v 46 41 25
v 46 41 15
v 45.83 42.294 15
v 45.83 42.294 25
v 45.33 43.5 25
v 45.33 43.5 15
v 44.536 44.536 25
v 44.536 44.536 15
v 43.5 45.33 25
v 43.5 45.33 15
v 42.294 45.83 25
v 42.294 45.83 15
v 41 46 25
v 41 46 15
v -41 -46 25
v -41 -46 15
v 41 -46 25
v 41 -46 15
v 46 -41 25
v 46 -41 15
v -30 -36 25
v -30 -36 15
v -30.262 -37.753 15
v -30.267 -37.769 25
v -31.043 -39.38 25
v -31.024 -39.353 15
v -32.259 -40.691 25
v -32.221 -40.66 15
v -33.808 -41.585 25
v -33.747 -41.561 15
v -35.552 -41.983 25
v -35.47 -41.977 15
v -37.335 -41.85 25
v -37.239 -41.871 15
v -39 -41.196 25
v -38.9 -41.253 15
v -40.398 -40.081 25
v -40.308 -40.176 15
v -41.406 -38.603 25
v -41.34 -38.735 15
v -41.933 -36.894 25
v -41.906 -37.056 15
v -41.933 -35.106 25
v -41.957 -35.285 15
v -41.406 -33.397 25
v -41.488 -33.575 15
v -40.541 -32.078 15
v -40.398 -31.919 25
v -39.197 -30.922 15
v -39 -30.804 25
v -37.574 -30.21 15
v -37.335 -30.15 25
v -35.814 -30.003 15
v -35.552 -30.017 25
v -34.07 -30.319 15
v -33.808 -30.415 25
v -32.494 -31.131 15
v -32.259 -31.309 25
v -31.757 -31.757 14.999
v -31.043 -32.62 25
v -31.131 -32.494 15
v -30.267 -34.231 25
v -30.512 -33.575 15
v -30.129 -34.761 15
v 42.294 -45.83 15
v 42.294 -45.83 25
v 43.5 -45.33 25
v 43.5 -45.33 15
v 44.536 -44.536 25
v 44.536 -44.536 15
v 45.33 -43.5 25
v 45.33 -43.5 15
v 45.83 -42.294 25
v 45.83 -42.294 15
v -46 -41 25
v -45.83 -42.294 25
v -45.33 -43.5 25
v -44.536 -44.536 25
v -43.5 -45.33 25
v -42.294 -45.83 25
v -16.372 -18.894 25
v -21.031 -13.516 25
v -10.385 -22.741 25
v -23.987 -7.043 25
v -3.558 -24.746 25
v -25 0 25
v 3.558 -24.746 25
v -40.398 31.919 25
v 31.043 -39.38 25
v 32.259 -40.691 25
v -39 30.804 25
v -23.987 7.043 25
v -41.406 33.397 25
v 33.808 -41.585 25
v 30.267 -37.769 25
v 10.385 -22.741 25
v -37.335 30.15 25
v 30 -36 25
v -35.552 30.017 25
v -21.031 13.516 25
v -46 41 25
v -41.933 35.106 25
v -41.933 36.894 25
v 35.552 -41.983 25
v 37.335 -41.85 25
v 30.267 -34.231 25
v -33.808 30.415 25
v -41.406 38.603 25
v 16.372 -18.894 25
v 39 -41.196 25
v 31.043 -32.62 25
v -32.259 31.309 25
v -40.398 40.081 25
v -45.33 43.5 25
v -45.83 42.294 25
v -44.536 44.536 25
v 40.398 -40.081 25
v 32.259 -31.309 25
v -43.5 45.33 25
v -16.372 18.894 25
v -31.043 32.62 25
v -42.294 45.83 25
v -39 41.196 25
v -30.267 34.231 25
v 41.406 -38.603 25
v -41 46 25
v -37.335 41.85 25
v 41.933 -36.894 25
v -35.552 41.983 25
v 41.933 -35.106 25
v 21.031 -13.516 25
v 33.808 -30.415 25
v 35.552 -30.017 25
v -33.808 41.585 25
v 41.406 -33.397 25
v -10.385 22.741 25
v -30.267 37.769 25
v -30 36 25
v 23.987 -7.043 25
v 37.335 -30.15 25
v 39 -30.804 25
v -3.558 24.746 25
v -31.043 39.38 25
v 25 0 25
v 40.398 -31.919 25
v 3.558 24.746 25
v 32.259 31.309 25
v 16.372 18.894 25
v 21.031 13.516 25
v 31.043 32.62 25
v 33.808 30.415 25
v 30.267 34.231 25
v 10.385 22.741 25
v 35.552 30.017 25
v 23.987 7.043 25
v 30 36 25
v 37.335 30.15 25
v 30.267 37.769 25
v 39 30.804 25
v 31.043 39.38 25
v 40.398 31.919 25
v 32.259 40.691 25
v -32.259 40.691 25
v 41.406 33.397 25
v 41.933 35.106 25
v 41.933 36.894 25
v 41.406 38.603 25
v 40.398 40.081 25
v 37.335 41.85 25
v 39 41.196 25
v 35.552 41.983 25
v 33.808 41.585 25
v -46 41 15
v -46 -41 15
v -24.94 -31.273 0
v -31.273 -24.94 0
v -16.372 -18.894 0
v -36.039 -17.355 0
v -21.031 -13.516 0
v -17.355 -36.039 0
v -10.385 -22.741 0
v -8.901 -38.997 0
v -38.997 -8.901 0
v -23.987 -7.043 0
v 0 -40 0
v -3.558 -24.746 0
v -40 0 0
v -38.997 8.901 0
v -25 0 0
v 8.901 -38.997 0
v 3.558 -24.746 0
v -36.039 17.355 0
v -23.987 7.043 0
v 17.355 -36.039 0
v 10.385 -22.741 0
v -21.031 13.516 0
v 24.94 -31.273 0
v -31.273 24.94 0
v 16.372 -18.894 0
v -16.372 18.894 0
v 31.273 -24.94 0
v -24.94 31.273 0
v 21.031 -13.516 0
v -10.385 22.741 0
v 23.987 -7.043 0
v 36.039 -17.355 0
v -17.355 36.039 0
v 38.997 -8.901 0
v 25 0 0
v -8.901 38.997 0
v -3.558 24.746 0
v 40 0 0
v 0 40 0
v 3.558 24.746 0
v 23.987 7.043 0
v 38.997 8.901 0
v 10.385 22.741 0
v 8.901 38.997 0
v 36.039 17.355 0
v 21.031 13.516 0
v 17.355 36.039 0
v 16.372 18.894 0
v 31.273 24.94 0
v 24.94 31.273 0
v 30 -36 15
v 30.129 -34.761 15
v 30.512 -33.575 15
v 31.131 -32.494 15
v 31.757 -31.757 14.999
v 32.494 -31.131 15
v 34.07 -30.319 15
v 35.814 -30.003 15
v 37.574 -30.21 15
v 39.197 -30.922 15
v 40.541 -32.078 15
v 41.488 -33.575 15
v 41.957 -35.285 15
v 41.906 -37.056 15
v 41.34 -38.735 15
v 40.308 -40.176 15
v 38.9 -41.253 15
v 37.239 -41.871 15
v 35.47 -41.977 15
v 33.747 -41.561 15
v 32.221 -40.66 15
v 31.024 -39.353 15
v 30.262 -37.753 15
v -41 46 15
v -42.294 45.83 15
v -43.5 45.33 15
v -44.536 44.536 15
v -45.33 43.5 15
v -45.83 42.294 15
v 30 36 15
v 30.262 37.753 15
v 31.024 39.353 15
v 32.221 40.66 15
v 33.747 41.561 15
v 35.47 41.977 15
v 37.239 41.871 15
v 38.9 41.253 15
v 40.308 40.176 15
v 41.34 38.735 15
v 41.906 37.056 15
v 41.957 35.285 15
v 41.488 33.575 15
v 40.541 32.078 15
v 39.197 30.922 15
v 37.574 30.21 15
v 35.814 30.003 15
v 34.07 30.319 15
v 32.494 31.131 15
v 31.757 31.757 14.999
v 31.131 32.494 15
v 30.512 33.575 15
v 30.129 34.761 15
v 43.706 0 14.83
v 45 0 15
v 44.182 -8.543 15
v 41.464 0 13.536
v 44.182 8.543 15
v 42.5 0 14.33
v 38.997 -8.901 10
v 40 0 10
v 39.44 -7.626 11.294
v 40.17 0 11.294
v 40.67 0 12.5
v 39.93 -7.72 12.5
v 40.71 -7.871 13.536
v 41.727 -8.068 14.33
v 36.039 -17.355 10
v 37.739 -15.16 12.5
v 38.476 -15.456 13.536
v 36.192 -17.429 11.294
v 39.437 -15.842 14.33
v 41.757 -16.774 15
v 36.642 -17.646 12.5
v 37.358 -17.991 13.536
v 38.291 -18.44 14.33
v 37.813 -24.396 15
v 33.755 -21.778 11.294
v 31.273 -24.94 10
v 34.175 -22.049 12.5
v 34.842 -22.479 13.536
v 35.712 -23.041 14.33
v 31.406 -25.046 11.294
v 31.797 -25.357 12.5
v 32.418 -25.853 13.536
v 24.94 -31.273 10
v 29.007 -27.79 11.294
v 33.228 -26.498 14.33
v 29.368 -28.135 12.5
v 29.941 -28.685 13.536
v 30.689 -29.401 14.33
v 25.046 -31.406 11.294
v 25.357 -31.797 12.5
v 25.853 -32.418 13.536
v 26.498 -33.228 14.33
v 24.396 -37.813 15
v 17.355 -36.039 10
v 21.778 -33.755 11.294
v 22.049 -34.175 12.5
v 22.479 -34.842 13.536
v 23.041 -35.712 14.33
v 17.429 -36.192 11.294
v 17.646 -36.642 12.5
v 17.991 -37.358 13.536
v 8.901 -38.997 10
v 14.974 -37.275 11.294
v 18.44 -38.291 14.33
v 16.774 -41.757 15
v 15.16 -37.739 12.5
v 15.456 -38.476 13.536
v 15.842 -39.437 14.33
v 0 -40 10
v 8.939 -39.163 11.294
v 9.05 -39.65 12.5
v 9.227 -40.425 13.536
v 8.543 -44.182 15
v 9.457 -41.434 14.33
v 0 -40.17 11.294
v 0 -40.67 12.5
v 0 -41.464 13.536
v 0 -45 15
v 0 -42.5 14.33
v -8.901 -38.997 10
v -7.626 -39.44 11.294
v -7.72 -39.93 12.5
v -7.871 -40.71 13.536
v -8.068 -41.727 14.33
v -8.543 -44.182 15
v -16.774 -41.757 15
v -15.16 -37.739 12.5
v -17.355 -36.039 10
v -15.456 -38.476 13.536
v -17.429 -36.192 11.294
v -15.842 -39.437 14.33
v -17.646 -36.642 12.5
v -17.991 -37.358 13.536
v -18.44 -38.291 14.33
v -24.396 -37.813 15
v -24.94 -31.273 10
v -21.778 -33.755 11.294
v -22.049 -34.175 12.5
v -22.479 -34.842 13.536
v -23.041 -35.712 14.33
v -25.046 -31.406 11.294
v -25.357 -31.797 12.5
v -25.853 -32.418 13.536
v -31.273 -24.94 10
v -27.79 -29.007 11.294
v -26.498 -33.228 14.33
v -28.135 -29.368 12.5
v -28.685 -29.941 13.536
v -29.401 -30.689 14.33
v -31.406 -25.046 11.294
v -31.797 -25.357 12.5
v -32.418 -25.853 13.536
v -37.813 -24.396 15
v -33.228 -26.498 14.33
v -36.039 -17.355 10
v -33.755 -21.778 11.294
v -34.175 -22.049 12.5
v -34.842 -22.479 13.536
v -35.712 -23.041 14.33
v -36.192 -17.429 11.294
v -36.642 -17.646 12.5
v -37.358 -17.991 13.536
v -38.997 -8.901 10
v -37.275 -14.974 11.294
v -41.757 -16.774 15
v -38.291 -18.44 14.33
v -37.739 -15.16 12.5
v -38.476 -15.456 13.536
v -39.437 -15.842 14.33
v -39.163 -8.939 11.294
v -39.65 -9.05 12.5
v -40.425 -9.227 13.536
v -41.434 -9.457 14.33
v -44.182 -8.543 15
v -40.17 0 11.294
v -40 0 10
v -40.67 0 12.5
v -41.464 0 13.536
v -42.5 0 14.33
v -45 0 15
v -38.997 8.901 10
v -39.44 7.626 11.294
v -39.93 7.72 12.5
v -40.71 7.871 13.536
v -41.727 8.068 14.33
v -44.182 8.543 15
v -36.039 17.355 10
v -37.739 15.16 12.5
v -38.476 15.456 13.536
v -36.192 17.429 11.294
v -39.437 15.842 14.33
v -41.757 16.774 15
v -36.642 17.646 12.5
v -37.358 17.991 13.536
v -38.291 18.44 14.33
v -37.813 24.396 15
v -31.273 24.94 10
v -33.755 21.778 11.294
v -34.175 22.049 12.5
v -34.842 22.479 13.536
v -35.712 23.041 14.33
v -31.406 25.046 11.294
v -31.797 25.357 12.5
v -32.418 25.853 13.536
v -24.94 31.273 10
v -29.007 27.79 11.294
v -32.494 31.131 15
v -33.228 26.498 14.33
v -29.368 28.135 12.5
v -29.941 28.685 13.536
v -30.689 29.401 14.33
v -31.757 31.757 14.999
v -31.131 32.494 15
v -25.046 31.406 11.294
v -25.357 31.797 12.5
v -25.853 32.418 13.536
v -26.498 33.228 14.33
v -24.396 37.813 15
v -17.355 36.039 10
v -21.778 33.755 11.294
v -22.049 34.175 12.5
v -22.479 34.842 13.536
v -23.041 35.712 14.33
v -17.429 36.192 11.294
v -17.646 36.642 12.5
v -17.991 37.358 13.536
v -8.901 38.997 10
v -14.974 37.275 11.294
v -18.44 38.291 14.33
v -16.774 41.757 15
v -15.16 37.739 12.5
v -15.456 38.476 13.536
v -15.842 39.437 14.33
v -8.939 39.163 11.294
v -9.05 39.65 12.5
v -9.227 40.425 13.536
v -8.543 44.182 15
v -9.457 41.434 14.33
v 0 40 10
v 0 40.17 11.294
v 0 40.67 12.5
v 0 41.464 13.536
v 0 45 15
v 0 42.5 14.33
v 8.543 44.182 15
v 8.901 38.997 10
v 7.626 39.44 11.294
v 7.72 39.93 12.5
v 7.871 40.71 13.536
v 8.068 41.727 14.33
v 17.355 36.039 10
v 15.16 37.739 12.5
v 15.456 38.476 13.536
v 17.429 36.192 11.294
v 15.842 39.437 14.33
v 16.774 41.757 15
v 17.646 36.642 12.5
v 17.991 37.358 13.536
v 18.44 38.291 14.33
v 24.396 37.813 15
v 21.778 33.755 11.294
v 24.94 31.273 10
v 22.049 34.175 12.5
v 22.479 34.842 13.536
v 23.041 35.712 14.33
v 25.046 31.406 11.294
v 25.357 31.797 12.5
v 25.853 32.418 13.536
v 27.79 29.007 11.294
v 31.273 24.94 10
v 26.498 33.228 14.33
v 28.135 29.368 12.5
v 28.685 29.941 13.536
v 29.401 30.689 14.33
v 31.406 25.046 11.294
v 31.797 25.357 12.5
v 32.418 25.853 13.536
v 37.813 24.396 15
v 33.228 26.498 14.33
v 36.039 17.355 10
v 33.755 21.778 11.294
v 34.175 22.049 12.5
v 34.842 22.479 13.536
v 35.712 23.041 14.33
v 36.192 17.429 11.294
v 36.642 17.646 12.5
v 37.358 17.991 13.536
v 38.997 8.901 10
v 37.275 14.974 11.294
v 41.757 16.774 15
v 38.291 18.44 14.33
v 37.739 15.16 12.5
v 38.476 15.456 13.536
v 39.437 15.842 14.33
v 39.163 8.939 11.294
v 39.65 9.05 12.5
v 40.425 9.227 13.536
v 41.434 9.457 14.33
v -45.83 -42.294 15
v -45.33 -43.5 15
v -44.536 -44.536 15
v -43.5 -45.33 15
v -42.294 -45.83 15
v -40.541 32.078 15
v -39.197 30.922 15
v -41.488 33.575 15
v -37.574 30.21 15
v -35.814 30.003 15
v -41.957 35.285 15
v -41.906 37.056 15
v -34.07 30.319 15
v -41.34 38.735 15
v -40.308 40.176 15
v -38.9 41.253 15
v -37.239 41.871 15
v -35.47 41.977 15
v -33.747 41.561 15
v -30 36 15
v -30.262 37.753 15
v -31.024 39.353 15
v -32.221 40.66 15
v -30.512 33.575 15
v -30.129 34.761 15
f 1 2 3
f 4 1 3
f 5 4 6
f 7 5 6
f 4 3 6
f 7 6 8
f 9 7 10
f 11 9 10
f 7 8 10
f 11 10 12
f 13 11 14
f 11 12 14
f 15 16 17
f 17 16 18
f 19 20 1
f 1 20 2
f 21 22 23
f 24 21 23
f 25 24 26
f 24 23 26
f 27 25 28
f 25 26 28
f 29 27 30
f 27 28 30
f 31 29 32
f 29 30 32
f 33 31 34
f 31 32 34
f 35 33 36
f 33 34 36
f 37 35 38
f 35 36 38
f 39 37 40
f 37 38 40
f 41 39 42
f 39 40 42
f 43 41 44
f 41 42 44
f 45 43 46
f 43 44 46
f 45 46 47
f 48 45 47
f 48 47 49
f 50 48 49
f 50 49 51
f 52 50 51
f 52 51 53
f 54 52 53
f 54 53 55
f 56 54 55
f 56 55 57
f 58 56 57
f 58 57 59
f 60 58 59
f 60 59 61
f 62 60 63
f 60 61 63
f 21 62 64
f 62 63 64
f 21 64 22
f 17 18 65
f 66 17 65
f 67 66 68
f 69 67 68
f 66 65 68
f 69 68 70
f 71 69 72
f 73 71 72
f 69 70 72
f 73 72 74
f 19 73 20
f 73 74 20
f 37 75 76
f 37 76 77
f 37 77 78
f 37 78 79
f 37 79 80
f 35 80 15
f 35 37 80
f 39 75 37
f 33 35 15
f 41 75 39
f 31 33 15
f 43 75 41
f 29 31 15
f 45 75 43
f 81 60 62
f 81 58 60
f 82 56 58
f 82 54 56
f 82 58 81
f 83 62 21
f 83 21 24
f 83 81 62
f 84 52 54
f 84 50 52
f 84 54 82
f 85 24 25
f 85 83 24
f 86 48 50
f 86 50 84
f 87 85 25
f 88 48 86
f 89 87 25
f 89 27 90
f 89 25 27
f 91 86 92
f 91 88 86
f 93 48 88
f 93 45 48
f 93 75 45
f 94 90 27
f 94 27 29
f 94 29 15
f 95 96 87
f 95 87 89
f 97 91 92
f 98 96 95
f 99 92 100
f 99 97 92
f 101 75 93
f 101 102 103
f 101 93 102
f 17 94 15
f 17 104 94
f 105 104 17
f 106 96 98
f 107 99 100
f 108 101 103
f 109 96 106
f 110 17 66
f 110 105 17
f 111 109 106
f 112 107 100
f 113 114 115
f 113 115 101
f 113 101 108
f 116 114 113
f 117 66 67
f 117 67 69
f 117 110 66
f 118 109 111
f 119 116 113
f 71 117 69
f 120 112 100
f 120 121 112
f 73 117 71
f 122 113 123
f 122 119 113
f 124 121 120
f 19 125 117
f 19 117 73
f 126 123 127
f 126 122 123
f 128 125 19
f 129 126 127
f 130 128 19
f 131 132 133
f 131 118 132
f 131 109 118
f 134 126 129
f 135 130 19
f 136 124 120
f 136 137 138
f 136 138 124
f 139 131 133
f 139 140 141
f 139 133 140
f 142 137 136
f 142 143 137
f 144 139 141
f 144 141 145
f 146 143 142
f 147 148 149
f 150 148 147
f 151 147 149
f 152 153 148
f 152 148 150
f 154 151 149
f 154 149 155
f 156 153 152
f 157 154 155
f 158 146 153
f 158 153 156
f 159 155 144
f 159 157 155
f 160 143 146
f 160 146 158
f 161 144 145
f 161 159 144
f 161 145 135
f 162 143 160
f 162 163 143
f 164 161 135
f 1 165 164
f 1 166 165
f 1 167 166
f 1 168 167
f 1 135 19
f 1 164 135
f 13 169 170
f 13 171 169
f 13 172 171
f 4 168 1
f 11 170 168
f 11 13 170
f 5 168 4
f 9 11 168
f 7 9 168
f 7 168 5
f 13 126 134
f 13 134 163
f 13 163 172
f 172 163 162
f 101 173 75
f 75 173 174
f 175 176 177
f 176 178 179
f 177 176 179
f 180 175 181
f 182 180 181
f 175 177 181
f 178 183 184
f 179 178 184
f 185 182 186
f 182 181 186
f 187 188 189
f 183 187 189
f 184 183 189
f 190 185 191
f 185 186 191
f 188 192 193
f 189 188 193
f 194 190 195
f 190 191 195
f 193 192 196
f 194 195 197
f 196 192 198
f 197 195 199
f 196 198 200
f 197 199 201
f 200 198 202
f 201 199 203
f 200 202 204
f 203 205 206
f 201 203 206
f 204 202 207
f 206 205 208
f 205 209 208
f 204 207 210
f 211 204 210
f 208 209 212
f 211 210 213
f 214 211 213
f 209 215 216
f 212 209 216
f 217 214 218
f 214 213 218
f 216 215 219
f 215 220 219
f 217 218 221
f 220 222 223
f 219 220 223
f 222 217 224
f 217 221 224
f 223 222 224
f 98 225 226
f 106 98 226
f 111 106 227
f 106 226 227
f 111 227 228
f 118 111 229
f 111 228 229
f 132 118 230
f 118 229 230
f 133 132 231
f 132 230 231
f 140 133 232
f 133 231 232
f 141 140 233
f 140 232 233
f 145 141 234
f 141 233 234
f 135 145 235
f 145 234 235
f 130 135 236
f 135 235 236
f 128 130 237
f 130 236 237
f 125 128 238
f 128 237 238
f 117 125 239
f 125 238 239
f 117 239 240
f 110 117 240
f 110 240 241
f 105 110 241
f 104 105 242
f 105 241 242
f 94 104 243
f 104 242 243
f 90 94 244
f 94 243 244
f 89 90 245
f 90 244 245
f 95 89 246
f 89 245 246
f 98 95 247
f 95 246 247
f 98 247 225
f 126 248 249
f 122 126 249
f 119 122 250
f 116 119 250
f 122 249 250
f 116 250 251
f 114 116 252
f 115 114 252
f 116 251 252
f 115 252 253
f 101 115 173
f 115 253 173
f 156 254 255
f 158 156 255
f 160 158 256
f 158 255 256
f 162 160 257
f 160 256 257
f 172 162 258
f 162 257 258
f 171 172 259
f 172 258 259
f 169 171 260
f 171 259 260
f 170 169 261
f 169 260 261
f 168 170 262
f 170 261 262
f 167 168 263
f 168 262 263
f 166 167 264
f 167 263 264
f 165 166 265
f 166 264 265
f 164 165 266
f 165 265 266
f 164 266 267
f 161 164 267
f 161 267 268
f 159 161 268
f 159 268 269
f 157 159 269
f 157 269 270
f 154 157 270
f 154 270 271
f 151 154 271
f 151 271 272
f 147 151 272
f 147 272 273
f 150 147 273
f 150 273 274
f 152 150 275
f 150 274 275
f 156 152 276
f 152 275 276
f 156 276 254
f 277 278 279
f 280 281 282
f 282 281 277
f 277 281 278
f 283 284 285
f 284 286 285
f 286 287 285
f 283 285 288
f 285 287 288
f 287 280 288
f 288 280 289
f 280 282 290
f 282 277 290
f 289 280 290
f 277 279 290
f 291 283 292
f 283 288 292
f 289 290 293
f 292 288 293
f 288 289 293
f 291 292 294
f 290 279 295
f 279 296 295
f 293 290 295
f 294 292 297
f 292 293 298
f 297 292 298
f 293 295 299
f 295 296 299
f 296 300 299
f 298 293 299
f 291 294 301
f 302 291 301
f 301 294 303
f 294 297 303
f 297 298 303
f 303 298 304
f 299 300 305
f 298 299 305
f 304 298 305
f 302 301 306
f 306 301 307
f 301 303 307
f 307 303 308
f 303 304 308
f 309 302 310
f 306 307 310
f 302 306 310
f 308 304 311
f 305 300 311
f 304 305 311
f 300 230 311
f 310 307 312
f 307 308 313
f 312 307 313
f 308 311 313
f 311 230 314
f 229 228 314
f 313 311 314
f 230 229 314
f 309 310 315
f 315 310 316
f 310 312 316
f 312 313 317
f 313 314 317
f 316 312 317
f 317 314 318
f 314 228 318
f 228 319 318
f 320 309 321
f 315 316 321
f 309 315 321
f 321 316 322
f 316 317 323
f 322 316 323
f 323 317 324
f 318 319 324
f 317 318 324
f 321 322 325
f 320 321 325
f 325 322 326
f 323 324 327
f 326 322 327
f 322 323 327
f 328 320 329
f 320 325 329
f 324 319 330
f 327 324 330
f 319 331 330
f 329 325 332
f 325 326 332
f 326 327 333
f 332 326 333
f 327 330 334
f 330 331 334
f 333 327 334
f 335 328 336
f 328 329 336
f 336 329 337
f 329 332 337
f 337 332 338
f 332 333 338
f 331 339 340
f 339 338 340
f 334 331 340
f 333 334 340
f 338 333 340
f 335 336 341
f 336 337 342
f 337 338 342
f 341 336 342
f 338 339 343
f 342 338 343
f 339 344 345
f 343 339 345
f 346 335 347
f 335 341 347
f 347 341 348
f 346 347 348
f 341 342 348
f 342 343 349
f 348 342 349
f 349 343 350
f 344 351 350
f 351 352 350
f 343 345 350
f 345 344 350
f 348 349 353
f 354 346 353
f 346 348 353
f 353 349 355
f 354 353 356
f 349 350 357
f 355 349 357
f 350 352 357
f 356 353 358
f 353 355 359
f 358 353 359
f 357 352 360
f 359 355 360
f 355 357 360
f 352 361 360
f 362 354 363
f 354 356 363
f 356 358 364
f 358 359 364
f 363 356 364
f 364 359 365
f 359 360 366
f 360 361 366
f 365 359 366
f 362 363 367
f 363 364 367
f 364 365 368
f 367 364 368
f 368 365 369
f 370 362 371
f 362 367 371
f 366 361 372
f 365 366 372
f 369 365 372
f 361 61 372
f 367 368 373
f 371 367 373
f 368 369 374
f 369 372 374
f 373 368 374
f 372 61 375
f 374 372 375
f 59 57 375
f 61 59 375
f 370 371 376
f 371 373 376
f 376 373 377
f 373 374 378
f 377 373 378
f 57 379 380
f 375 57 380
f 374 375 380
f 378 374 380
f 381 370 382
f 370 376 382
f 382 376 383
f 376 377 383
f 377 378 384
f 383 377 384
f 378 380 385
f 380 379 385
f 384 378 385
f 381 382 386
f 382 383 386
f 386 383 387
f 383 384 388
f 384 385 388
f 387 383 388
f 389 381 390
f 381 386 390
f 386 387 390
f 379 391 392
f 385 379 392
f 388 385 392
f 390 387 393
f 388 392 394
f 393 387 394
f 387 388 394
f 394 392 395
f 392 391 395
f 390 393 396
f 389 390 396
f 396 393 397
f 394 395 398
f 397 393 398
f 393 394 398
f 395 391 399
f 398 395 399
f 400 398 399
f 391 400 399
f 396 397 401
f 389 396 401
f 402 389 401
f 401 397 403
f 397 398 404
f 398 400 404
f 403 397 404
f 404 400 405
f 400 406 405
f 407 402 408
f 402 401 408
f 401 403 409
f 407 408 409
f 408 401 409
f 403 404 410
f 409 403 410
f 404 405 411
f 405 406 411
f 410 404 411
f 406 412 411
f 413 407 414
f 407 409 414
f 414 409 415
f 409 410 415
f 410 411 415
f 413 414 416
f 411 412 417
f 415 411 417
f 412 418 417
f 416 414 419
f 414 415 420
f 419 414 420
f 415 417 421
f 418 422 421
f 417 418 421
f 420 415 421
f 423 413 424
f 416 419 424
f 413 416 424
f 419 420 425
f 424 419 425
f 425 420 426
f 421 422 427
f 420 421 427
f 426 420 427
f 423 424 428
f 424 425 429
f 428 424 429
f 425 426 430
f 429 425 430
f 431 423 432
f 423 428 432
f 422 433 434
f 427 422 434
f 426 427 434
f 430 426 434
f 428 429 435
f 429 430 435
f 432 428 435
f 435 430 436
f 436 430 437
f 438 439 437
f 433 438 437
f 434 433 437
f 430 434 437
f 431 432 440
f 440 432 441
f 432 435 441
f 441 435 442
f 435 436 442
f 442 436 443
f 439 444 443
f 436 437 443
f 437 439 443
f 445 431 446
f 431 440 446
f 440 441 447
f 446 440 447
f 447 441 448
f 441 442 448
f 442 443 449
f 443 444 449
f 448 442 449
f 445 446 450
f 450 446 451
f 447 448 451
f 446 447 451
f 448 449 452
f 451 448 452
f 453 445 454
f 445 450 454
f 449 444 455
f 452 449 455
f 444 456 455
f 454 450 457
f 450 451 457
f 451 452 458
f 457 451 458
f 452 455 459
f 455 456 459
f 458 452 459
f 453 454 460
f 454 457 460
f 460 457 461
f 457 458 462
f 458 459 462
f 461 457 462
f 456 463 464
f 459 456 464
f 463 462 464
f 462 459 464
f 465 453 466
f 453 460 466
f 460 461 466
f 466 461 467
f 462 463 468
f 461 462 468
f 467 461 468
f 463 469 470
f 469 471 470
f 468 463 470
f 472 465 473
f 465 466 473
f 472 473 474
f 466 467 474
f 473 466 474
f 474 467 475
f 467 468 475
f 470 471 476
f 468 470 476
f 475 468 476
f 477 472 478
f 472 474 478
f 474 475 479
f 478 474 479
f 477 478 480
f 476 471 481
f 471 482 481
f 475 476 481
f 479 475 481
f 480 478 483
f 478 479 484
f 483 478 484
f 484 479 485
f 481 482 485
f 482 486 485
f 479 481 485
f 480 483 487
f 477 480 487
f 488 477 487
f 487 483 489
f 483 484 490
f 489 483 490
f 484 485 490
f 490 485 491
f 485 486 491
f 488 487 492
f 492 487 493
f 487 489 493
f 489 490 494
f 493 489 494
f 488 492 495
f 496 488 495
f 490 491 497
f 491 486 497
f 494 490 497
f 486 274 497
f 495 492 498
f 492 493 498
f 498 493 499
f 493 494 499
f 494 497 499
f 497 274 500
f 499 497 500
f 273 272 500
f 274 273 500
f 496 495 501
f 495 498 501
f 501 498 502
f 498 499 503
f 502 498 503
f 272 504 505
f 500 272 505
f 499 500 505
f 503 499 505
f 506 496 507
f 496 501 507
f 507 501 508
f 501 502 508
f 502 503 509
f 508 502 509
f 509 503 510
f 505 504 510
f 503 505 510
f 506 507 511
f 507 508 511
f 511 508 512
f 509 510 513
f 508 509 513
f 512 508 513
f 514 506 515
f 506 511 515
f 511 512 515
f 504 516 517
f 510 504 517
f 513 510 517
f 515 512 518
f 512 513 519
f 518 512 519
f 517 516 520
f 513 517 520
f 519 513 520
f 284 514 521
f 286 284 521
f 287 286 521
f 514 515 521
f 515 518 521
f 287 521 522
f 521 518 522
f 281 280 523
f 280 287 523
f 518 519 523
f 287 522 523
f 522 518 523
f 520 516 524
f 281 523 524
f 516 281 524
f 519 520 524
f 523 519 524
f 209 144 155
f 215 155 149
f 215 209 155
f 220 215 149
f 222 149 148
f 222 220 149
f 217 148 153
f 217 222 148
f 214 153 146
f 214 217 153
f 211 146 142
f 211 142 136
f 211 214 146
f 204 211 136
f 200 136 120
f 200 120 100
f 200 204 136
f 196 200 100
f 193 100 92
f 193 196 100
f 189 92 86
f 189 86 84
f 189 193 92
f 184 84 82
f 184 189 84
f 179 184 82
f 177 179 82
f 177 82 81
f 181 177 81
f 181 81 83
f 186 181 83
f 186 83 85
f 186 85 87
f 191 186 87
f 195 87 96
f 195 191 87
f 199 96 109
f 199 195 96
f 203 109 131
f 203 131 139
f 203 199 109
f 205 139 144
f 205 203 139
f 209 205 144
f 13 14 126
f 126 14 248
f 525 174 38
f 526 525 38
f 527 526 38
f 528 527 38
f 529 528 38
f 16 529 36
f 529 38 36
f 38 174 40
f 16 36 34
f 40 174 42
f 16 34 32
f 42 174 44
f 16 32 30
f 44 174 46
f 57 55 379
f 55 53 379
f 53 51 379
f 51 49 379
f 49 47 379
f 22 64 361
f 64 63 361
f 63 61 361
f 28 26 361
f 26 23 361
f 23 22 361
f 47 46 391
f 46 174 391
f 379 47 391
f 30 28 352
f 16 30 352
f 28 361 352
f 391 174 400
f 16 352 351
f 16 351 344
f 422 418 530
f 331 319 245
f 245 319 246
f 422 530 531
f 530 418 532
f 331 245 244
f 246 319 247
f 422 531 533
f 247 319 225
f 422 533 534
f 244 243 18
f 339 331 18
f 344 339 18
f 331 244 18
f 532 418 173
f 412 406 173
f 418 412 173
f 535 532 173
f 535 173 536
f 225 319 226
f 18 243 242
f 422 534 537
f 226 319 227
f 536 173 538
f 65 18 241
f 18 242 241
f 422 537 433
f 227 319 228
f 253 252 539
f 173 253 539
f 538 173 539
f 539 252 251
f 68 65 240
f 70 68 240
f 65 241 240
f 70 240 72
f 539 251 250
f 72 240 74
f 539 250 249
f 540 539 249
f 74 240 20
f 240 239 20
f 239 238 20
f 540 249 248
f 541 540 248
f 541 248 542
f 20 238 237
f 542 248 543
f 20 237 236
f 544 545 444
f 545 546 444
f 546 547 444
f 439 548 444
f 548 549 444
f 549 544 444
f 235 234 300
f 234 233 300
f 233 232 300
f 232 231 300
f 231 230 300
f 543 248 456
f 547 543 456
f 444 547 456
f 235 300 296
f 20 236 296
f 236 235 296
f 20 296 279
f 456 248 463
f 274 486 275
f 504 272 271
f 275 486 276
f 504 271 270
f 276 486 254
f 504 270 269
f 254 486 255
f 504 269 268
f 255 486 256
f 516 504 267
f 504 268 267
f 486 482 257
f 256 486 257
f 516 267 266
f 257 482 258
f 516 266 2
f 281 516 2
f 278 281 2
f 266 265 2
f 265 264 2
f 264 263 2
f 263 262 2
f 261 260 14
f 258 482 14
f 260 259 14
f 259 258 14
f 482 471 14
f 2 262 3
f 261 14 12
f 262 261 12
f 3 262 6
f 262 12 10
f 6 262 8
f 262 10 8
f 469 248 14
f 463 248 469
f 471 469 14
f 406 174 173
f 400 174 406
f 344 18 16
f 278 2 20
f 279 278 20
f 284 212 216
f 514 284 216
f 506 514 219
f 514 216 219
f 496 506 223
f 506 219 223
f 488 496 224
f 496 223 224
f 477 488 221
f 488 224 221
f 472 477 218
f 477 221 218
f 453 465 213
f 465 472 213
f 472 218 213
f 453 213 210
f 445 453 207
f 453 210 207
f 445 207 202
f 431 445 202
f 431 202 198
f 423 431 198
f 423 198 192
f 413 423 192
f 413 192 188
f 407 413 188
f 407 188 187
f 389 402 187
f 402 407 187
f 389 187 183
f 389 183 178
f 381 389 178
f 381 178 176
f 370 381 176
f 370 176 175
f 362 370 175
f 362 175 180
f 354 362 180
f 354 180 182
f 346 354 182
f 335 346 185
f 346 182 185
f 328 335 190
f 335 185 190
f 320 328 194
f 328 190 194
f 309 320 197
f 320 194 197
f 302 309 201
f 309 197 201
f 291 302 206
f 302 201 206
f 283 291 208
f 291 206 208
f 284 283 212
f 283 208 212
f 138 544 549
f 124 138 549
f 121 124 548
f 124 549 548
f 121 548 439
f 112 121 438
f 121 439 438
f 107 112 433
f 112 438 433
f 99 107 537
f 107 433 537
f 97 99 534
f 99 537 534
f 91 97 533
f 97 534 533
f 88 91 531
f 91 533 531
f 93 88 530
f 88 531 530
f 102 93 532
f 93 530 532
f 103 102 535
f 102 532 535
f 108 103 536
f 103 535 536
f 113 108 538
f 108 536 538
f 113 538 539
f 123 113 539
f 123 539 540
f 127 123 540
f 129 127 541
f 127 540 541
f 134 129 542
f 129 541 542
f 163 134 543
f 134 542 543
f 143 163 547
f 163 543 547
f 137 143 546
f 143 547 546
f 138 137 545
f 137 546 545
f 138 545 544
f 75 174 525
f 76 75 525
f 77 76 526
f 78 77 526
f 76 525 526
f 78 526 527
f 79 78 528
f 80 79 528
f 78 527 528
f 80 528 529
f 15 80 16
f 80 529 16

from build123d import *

# Parameters (mm, degrees)
ESQUISSE1_R        = 40
ESQUISSE1_R_2      = 25
BOSS_EXTRU_1_DEPTH = 25
BOSS_EXTRU_2_START = -10
ESQUISSE4_R        = 6
ESQUISSE4_R_2      = 25
BOSS_EXTRU_2_DEPTH = 10
CONG_1_R           = 5


with BuildPart() as part:
    # Esquisse1 → Boss.-Extru.1 (new body)
    with BuildSketch(Plane.XY):
        Circle(ESQUISSE1_R)
        Circle(ESQUISSE1_R_2, mode=Mode.SUBTRACT)
    extrude(amount=BOSS_EXTRU_1_DEPTH)

    # Esquisse4 → Boss.-Extru.2 (add)
    with BuildSketch(Plane.XY.offset(25).offset(BOSS_EXTRU_2_START)):
        with BuildLine():
            Line((41, 46), (-41, 46))
            ThreePointArc((-41, 46), (-44.535533906, 44.535533906), (-46, 41))
            Line((-46, 41), (-46, -41))
            ThreePointArc((-46, -41), (-44.535533906, -44.535533906), (-41, -46))
            Line((-41, -46), (41, -46))
            ThreePointArc((41, -46), (44.535533906, -44.535533906), (46, -41))
            Line((46, -41), (46, 41))
            ThreePointArc((46, 41), (44.535533906, 44.535533906), (41, 46))
        make_face()
        with Locations((-36, 36)):
            Circle(ESQUISSE4_R, mode=Mode.SUBTRACT)
        with Locations((-36, -36)):
            Circle(ESQUISSE4_R, mode=Mode.SUBTRACT)
        with Locations(Location((36, -36, 0), (0, 0, 180))):
            Circle(ESQUISSE4_R, mode=Mode.SUBTRACT)
        with Locations(Location((36, 36, 0), (0, 0, 180))):
            Circle(ESQUISSE4_R, mode=Mode.SUBTRACT)
        Circle(ESQUISSE4_R_2, mode=Mode.SUBTRACT)
    extrude(amount=BOSS_EXTRU_2_DEPTH)

    # Congé1
    # the kernel refuses this fillet: 5 mm, written as the material it adds along each edge
    with BuildSketch(Plane(origin=(0, 0, 15), x_dir=(1, 0, 0), z_dir=(0, 1, 0))) as cong_1_piece_1_section:
        with BuildLine():
            CenterArc((40 + CONG_1_R, CONG_1_R), CONG_1_R, 180, 90)
            Line((40 + CONG_1_R, 0), (40, 0))
            Line((40, 0), (40, CONG_1_R))
        make_face()
    cong_1_piece_1 = revolve(axis=Axis((0, 0, 15), (0, 0, -1)), mode=Mode.PRIVATE)
    cong_1_piece_1 = cong_1_piece_1 - Plane(origin=(36, 36, 13.61437319), x_dir=(-1, 0, 0), z_dir=(0, 0, -1)) * Cylinder(6, 180, mode=Mode.PRIVATE)
    cong_1_piece_1 = cong_1_piece_1 - Plane(origin=(-36, 36, 13.61437319), x_dir=(1, 0, 0), z_dir=(0, 0, -1)) * Cylinder(6, 180, mode=Mode.PRIVATE)
    cong_1_piece_1 = cong_1_piece_1 - Plane(origin=(36, -36, 13.61437319), x_dir=(-1, 0, 0), z_dir=(0, 0, -1)) * Cylinder(6, 180, mode=Mode.PRIVATE)
    cong_1_piece_1 = cong_1_piece_1 - Plane(origin=(-36, -36, 13.61437319), x_dir=(1, 0, 0), z_dir=(0, 0, -1)) * Cylinder(6, 180, mode=Mode.PRIVATE)
    add(cong_1_piece_1)


solid = part.part
